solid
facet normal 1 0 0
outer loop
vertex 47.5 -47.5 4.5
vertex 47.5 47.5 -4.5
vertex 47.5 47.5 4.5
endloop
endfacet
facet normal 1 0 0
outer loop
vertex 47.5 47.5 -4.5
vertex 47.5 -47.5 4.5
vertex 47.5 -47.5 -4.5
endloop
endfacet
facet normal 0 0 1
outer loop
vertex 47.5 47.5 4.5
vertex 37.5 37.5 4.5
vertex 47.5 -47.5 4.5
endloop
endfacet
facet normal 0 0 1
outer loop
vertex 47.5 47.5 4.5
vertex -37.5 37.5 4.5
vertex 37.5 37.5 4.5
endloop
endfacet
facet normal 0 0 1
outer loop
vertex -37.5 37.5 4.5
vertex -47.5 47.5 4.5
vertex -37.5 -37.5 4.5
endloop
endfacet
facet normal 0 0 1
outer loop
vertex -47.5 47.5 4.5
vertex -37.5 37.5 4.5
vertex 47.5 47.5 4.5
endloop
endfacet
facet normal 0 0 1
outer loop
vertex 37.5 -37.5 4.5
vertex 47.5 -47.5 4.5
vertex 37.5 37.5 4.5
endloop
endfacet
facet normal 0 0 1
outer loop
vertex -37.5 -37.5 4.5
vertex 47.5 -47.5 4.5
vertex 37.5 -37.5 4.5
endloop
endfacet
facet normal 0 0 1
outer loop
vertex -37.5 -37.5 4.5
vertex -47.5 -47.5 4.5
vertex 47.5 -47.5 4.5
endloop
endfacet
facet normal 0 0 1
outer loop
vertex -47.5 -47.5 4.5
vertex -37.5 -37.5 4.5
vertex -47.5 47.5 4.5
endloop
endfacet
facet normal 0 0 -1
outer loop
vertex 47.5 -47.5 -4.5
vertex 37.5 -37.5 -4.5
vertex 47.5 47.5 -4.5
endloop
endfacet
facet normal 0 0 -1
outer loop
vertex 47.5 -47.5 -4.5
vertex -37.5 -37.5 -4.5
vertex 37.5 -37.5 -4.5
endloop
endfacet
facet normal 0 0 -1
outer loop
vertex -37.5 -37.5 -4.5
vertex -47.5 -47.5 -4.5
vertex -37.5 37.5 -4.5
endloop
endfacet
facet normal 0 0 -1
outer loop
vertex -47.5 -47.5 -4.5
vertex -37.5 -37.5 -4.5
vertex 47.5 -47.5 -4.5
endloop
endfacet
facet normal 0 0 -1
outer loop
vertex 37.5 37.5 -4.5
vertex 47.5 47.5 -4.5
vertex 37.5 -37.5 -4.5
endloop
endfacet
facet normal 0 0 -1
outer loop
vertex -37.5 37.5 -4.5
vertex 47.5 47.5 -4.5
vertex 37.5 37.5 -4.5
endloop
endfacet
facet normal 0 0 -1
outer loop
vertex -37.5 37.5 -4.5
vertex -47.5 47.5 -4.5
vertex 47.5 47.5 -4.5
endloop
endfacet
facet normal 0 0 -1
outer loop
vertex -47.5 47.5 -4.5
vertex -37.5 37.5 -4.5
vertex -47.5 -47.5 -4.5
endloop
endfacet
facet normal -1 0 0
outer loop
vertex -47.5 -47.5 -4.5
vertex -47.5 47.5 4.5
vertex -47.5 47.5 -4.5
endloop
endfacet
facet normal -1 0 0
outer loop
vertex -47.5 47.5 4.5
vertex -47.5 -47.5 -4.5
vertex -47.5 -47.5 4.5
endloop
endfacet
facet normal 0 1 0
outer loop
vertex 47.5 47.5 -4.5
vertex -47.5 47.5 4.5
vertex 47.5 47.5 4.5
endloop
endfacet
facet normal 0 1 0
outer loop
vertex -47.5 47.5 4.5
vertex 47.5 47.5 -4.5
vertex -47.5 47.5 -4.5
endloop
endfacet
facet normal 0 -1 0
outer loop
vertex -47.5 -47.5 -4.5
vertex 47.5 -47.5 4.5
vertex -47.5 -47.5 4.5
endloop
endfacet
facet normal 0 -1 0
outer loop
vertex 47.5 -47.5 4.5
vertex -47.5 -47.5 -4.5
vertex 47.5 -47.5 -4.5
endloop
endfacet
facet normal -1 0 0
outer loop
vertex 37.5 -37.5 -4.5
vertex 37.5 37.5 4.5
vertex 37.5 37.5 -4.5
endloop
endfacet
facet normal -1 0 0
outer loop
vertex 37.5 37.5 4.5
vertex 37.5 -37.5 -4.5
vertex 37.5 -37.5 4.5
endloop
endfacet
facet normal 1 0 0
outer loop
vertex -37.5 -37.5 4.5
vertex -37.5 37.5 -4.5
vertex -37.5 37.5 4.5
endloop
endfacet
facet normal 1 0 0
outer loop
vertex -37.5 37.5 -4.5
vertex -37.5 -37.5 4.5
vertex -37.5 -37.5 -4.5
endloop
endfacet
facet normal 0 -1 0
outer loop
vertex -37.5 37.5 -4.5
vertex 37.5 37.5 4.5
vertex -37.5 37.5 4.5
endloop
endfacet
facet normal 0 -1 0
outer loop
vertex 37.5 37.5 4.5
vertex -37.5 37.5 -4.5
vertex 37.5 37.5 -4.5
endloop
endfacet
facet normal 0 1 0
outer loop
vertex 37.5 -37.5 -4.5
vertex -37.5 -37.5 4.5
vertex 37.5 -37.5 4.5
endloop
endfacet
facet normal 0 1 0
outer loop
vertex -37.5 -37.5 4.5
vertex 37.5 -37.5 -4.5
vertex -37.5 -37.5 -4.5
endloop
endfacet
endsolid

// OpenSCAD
// Square frame-like panel, bounding box: 95 x 95 x 9 mm

outer_L = 95.0;      // mm
outer_W = 95.0;      // mm
thickness = 9.0;     // mm

border = 10.0;       // mm (uniform frame border)

inner_L = outer_L - 2*border;
inner_W = outer_W - 2*border;

difference() {
    cube([outer_L, outer_W, thickness], center=true);
    cube([inner_L, inner_W, thickness + 0.2], center=true); // slight overshoot ensures clean cut
}
